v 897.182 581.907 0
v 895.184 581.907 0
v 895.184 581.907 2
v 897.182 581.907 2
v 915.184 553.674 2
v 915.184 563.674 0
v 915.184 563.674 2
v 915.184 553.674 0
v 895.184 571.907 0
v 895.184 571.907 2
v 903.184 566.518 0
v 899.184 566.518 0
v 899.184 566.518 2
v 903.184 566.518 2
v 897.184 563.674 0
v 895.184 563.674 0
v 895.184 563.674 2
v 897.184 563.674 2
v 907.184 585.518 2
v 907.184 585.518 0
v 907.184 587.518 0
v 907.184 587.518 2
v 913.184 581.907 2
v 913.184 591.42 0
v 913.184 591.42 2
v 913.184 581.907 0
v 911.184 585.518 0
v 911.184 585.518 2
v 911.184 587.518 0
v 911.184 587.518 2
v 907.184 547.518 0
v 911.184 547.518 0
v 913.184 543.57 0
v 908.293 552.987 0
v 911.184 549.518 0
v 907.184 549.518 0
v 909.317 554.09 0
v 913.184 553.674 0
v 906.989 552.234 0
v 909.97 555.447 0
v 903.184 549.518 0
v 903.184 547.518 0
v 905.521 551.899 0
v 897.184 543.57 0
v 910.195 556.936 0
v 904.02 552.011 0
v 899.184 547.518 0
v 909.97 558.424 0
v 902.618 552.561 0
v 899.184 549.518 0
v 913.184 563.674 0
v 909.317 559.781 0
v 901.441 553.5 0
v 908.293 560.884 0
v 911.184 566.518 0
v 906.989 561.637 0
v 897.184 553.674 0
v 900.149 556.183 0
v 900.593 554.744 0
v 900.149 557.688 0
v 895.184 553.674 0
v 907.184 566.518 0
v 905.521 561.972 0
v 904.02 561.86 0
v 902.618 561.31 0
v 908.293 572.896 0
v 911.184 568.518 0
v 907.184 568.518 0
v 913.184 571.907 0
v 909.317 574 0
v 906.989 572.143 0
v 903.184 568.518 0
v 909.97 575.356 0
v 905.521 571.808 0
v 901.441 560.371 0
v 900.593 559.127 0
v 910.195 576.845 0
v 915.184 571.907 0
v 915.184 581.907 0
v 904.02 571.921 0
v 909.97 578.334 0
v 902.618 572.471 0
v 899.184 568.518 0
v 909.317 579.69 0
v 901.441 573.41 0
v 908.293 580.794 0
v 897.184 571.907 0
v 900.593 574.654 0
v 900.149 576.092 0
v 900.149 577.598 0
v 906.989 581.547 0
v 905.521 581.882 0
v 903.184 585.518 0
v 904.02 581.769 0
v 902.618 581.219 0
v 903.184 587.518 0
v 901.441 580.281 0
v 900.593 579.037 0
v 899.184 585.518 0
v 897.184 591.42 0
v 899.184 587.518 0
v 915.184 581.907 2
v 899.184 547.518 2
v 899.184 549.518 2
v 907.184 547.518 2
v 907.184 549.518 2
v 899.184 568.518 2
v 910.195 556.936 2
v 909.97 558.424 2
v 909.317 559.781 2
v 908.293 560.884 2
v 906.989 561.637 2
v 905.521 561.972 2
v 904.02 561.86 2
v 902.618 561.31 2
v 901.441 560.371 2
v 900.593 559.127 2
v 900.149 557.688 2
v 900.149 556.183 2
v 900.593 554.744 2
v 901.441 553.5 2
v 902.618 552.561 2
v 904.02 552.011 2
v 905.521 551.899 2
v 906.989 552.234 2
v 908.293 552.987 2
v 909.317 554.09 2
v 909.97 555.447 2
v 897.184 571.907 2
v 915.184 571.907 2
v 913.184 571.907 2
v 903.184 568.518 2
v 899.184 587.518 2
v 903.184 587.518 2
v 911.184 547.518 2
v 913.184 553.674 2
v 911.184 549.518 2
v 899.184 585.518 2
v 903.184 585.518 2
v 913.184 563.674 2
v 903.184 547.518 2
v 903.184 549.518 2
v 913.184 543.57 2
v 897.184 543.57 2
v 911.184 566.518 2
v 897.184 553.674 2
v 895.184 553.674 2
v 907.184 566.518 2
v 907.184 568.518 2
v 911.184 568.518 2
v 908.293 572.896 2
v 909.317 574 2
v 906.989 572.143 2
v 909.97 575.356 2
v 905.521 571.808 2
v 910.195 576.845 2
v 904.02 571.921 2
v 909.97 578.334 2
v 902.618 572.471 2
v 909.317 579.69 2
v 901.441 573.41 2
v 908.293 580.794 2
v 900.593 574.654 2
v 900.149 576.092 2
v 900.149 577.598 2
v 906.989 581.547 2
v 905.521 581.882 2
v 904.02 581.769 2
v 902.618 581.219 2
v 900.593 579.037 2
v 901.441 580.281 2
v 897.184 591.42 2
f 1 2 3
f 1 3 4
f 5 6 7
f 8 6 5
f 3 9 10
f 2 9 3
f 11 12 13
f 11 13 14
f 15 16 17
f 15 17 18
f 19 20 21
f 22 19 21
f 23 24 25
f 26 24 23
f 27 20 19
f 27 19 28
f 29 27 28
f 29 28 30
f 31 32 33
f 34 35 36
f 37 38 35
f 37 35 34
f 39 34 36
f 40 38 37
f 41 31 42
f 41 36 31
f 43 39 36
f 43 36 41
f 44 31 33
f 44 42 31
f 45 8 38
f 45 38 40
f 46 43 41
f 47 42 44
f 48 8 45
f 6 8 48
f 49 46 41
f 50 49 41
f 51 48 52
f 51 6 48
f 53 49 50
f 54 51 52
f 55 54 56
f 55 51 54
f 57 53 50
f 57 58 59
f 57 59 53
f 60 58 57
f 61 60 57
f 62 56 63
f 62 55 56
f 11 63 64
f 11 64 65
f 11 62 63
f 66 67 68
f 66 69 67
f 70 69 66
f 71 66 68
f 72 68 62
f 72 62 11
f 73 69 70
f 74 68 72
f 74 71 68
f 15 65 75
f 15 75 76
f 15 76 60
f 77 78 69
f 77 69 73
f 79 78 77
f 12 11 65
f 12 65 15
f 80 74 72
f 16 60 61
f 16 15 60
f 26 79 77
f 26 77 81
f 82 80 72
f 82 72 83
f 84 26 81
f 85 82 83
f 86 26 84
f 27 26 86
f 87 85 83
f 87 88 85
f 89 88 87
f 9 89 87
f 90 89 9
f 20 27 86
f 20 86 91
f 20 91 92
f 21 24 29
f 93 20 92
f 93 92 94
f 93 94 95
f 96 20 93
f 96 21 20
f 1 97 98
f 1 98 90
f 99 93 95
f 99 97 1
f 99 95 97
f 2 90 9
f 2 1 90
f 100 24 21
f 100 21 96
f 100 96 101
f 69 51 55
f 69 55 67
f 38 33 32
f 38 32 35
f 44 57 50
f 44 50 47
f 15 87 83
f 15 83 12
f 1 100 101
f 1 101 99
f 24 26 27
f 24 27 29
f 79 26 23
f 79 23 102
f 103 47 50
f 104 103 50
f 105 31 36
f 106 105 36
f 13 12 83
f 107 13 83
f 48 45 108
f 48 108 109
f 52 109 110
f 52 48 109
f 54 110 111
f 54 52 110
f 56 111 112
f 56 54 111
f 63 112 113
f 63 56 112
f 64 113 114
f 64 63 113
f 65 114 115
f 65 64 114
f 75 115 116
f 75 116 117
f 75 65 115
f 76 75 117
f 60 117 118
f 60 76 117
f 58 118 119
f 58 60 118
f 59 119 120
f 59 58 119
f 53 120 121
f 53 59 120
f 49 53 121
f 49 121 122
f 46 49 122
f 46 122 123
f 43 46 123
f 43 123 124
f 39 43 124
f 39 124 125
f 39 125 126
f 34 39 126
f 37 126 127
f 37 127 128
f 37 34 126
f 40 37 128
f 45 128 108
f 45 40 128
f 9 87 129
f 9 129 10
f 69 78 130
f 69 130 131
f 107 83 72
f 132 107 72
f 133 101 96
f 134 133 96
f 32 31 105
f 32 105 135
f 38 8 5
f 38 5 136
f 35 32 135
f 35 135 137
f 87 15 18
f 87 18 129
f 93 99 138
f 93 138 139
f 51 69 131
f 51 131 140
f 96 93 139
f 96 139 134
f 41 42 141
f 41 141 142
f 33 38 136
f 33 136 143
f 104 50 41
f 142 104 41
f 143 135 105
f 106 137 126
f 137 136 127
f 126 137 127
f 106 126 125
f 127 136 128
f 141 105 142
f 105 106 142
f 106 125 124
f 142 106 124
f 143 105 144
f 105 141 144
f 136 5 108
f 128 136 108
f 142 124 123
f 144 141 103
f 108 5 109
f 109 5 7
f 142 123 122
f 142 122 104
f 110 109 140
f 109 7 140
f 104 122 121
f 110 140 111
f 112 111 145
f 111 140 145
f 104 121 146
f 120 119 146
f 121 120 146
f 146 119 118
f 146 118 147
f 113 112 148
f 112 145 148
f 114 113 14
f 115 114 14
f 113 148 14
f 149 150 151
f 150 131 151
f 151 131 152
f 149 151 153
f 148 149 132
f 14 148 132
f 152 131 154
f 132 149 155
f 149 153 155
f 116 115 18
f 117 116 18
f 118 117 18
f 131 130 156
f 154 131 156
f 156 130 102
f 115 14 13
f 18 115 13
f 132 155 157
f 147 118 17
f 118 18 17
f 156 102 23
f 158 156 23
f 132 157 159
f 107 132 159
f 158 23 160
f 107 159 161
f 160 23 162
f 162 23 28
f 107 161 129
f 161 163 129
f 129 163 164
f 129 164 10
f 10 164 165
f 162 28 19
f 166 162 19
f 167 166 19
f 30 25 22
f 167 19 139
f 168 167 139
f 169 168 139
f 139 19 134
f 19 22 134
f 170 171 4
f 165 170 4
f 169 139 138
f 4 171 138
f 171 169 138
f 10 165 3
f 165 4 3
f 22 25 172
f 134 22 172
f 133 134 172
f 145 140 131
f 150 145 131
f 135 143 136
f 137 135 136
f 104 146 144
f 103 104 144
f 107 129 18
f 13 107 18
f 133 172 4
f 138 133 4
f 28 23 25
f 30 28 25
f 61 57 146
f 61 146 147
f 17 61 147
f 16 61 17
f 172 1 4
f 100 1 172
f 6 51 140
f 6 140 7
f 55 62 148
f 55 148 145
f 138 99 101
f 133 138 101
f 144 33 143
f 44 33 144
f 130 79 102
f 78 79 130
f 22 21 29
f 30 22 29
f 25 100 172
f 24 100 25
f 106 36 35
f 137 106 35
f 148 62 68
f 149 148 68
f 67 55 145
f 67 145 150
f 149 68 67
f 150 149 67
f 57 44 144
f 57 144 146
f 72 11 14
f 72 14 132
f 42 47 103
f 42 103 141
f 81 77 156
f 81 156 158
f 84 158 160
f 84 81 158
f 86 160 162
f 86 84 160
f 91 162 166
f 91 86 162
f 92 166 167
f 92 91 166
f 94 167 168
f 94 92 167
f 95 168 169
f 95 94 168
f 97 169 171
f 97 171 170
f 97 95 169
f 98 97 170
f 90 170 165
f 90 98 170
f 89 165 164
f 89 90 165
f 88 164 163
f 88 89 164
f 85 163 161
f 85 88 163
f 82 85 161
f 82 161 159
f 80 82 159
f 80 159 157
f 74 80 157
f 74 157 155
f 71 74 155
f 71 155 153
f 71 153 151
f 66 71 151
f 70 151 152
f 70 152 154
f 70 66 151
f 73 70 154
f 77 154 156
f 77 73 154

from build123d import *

# Parameters (mm, degrees)
MODEL_R         = 5.050911301
MODEL_W         = 4
MODEL_H         = 2
EXTRUDE_1_DEPTH = 2


with BuildPart() as part:
    # Model → 凸台-拉伸1 (new body)
    with BuildSketch(Plane.XY):
        Polygon((913.184335601, 571.907106356), (913.184335601, 563.673975647), (915.184335601, 563.673975647), (915.184335601, 553.673975647), (913.184335601, 553.673975647), (913.184335601, 543.570261409), (897.184335601, 543.570261409), (897.184335601, 553.673975647), (895.184335601, 553.673975647), (895.184335601, 563.673975647), (897.184335601, 563.673975647), (897.184335601, 571.907106356), (895.184335601, 571.907106356), (895.184335601, 581.907106356), (897.182393273, 581.907106356), (897.184335601, 591.419721737), (913.184335601, 591.419721737), (913.184335601, 581.907106356), (915.184335601, 581.907106356), (915.184335601, 571.907106356), align=None)
        with Locations((905.143744205, 556.935517453)):
            Circle(MODEL_R, mode=Mode.SUBTRACT)
        with Locations((905.143744205, 576.845149384)):
            Circle(MODEL_R, mode=Mode.SUBTRACT)
        with Locations((909.184335601, 586.518067913)):
            Rectangle(MODEL_W, MODEL_H, mode=Mode.SUBTRACT)
        with Locations((901.184335601, 586.518067913)):
            Rectangle(MODEL_W, MODEL_H, mode=Mode.SUBTRACT)
        with Locations((909.184335601, 567.518067913)):
            Rectangle(MODEL_W, MODEL_H, mode=Mode.SUBTRACT)
        with Locations((901.184335601, 567.518067913)):
            Rectangle(MODEL_W, MODEL_H, mode=Mode.SUBTRACT)
        with Locations((909.184335601, 548.518067913)):
            Rectangle(MODEL_W, MODEL_H, mode=Mode.SUBTRACT)
        with Locations((901.184335601, 548.518067913)):
            Rectangle(MODEL_W, MODEL_H, mode=Mode.SUBTRACT)
    extrude(amount=EXTRUDE_1_DEPTH)


solid = part.part
